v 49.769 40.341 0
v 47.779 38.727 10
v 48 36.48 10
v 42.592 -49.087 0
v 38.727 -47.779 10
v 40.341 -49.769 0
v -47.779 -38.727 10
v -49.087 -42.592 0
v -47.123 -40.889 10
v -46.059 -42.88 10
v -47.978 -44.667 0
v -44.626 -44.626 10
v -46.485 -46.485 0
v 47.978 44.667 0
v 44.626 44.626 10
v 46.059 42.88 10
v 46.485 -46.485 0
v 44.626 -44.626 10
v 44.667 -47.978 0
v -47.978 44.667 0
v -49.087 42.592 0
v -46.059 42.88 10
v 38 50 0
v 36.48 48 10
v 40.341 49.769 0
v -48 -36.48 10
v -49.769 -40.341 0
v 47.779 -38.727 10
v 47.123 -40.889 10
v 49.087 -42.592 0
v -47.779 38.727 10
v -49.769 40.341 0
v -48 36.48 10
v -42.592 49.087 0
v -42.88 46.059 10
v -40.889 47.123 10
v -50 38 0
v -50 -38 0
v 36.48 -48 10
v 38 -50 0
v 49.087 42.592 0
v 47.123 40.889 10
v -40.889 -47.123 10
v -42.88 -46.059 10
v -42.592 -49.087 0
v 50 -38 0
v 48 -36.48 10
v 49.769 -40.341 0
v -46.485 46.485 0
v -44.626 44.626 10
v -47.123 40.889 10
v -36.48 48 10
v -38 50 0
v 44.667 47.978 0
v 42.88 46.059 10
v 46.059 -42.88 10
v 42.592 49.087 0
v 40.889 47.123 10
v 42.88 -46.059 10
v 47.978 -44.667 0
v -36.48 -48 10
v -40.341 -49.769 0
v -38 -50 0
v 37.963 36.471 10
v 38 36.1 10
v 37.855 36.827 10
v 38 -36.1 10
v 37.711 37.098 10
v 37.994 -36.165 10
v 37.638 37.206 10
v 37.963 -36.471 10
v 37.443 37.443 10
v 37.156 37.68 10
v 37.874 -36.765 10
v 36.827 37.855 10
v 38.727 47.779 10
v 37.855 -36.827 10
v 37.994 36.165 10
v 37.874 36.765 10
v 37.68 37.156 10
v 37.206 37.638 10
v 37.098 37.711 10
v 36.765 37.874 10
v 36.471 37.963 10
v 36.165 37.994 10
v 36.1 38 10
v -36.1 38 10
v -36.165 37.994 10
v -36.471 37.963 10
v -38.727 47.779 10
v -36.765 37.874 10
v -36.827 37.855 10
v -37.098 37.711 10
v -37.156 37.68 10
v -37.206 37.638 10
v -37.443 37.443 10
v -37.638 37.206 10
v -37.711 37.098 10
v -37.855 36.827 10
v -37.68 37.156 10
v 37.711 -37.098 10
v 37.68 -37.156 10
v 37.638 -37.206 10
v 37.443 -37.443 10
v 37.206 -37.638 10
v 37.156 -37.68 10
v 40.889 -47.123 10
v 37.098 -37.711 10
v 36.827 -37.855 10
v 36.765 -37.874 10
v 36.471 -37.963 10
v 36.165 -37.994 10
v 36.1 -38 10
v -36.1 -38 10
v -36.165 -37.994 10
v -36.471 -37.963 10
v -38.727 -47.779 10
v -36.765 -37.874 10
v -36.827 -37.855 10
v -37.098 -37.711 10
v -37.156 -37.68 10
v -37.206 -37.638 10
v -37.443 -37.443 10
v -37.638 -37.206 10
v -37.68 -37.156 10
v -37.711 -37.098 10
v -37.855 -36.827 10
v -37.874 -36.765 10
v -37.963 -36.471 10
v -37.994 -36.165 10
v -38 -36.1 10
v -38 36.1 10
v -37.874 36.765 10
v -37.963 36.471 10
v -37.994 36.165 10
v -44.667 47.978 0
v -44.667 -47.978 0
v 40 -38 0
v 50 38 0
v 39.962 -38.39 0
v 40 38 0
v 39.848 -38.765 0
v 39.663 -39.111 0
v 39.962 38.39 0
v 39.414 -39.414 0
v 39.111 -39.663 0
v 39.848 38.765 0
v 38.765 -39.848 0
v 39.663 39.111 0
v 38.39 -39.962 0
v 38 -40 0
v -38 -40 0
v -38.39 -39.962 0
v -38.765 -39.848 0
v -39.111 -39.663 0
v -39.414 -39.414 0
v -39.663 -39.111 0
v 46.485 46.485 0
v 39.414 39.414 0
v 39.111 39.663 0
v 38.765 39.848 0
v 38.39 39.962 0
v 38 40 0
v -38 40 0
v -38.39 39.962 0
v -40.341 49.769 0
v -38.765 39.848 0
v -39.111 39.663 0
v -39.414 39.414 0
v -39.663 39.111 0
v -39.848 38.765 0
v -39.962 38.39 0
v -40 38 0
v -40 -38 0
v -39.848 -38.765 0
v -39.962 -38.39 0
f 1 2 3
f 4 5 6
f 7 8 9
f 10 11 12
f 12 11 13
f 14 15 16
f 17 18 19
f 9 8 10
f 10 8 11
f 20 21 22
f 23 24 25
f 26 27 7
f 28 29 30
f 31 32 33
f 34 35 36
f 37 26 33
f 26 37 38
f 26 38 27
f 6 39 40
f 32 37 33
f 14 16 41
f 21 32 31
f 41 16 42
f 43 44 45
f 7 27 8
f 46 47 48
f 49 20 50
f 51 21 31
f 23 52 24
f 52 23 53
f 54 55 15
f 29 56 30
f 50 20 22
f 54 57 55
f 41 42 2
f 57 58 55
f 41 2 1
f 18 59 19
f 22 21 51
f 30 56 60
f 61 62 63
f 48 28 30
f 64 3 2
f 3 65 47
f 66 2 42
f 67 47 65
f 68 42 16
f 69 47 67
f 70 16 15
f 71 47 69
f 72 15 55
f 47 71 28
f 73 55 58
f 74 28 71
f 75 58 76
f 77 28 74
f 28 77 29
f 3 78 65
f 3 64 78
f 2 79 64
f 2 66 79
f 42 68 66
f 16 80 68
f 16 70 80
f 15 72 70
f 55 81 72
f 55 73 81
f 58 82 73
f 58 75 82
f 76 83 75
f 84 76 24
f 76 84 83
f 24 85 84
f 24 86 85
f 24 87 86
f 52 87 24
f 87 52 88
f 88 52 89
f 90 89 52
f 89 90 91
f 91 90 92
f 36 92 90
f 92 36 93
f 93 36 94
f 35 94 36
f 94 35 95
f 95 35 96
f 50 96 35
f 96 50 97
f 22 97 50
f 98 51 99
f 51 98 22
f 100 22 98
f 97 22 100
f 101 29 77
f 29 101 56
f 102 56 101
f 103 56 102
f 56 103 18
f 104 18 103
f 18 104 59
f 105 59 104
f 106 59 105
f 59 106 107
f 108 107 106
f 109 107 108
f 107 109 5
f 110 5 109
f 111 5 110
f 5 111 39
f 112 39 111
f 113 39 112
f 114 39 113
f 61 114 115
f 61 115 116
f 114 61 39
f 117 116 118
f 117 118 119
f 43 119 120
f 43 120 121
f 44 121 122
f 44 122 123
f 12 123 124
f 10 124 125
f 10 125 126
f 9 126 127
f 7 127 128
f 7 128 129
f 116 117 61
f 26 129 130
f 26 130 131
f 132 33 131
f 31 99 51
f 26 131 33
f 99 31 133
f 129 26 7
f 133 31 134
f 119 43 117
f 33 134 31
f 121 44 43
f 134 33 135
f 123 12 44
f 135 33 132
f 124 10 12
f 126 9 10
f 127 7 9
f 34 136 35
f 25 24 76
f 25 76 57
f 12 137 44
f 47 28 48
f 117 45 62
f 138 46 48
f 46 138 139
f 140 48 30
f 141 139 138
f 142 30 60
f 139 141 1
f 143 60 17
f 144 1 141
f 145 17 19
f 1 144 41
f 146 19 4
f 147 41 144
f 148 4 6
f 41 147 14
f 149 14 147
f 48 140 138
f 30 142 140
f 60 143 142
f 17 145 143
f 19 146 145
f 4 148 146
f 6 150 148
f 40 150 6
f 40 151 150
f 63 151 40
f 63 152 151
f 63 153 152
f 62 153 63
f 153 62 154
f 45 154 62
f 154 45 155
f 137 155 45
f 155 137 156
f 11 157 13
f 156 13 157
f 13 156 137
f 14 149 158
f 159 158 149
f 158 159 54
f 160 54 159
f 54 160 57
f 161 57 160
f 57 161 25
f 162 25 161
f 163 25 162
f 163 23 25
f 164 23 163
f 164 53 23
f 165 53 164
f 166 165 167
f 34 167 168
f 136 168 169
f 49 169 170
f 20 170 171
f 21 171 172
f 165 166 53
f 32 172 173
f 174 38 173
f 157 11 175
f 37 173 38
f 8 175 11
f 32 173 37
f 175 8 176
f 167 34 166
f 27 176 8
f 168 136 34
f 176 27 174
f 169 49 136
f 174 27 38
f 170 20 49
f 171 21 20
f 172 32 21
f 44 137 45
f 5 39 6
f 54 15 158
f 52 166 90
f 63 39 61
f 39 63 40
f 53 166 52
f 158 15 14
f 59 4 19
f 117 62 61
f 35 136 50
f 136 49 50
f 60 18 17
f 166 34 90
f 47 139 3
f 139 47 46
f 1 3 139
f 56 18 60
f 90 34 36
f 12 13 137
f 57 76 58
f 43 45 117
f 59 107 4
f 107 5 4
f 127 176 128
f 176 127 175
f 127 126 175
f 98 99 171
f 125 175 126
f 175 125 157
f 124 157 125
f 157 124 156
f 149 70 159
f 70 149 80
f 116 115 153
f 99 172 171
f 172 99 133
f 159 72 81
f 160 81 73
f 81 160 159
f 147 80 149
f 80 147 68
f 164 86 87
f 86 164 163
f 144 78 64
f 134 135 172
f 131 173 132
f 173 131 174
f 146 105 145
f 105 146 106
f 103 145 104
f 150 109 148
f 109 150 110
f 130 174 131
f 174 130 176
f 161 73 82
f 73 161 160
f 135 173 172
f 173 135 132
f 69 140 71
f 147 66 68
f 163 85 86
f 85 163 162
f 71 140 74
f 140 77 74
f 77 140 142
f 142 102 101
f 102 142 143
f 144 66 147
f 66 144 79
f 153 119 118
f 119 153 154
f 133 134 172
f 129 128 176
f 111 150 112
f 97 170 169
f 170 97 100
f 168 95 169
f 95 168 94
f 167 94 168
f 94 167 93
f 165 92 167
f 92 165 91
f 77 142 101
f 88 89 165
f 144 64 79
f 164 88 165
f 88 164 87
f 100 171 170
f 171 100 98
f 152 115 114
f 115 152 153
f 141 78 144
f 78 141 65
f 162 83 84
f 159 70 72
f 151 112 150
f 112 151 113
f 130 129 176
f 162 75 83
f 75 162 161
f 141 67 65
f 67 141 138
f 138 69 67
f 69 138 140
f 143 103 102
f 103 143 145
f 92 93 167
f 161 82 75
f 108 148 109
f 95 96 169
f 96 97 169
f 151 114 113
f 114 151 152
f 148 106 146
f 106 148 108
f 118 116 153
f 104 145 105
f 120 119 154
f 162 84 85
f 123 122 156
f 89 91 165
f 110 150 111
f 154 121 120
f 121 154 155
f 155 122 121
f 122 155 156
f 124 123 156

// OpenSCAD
$fn = 32;

// ----------------------------------------------------------------------
// Display bezel: 100 x 100 mm frame, opening 80x80 mm
// ----------------------------------------------------------------------

// --- parameters (mm) ---
length = 100;             // frame outside length, X
width = 100;              // frame outside width, Y
frame_w = 10;             // frame width
thickness = 10;           // frame thickness
corner_r = 12;            // outside corner radius
chamfer = 0.96;           // outer wall taper
funnel = 0.94;            // inner opening taper
opening_l = 80;           // opening length
opening_w = 80;           // opening width
inner_r = 2;              // opening corner radius

/* rounded-rectangle outlines, generated with loops */
module rounded_ring(l_nom, w_nom, r) {
  hull() {
    for (sx = [-1, 1]) for (sy = [-1, 1])
      translate([sx * (l_nom / 2 - r), sy * (w_nom / 2 - r)]) circle(r = r);
  }
}

difference() {
  /* frame body, drafted so the outer edge is a variable-depth chamfer */
  linear_extrude(height = thickness, scale = chamfer)
    rounded_ring(length, width, corner_r);
  /* viewing opening, drafted the other way for a funnel edge */
  linear_extrude(height = thickness + 2, scale = funnel)
    translate([0, 0, -1]) rounded_ring(opening_l, opening_w, inner_r);
}
